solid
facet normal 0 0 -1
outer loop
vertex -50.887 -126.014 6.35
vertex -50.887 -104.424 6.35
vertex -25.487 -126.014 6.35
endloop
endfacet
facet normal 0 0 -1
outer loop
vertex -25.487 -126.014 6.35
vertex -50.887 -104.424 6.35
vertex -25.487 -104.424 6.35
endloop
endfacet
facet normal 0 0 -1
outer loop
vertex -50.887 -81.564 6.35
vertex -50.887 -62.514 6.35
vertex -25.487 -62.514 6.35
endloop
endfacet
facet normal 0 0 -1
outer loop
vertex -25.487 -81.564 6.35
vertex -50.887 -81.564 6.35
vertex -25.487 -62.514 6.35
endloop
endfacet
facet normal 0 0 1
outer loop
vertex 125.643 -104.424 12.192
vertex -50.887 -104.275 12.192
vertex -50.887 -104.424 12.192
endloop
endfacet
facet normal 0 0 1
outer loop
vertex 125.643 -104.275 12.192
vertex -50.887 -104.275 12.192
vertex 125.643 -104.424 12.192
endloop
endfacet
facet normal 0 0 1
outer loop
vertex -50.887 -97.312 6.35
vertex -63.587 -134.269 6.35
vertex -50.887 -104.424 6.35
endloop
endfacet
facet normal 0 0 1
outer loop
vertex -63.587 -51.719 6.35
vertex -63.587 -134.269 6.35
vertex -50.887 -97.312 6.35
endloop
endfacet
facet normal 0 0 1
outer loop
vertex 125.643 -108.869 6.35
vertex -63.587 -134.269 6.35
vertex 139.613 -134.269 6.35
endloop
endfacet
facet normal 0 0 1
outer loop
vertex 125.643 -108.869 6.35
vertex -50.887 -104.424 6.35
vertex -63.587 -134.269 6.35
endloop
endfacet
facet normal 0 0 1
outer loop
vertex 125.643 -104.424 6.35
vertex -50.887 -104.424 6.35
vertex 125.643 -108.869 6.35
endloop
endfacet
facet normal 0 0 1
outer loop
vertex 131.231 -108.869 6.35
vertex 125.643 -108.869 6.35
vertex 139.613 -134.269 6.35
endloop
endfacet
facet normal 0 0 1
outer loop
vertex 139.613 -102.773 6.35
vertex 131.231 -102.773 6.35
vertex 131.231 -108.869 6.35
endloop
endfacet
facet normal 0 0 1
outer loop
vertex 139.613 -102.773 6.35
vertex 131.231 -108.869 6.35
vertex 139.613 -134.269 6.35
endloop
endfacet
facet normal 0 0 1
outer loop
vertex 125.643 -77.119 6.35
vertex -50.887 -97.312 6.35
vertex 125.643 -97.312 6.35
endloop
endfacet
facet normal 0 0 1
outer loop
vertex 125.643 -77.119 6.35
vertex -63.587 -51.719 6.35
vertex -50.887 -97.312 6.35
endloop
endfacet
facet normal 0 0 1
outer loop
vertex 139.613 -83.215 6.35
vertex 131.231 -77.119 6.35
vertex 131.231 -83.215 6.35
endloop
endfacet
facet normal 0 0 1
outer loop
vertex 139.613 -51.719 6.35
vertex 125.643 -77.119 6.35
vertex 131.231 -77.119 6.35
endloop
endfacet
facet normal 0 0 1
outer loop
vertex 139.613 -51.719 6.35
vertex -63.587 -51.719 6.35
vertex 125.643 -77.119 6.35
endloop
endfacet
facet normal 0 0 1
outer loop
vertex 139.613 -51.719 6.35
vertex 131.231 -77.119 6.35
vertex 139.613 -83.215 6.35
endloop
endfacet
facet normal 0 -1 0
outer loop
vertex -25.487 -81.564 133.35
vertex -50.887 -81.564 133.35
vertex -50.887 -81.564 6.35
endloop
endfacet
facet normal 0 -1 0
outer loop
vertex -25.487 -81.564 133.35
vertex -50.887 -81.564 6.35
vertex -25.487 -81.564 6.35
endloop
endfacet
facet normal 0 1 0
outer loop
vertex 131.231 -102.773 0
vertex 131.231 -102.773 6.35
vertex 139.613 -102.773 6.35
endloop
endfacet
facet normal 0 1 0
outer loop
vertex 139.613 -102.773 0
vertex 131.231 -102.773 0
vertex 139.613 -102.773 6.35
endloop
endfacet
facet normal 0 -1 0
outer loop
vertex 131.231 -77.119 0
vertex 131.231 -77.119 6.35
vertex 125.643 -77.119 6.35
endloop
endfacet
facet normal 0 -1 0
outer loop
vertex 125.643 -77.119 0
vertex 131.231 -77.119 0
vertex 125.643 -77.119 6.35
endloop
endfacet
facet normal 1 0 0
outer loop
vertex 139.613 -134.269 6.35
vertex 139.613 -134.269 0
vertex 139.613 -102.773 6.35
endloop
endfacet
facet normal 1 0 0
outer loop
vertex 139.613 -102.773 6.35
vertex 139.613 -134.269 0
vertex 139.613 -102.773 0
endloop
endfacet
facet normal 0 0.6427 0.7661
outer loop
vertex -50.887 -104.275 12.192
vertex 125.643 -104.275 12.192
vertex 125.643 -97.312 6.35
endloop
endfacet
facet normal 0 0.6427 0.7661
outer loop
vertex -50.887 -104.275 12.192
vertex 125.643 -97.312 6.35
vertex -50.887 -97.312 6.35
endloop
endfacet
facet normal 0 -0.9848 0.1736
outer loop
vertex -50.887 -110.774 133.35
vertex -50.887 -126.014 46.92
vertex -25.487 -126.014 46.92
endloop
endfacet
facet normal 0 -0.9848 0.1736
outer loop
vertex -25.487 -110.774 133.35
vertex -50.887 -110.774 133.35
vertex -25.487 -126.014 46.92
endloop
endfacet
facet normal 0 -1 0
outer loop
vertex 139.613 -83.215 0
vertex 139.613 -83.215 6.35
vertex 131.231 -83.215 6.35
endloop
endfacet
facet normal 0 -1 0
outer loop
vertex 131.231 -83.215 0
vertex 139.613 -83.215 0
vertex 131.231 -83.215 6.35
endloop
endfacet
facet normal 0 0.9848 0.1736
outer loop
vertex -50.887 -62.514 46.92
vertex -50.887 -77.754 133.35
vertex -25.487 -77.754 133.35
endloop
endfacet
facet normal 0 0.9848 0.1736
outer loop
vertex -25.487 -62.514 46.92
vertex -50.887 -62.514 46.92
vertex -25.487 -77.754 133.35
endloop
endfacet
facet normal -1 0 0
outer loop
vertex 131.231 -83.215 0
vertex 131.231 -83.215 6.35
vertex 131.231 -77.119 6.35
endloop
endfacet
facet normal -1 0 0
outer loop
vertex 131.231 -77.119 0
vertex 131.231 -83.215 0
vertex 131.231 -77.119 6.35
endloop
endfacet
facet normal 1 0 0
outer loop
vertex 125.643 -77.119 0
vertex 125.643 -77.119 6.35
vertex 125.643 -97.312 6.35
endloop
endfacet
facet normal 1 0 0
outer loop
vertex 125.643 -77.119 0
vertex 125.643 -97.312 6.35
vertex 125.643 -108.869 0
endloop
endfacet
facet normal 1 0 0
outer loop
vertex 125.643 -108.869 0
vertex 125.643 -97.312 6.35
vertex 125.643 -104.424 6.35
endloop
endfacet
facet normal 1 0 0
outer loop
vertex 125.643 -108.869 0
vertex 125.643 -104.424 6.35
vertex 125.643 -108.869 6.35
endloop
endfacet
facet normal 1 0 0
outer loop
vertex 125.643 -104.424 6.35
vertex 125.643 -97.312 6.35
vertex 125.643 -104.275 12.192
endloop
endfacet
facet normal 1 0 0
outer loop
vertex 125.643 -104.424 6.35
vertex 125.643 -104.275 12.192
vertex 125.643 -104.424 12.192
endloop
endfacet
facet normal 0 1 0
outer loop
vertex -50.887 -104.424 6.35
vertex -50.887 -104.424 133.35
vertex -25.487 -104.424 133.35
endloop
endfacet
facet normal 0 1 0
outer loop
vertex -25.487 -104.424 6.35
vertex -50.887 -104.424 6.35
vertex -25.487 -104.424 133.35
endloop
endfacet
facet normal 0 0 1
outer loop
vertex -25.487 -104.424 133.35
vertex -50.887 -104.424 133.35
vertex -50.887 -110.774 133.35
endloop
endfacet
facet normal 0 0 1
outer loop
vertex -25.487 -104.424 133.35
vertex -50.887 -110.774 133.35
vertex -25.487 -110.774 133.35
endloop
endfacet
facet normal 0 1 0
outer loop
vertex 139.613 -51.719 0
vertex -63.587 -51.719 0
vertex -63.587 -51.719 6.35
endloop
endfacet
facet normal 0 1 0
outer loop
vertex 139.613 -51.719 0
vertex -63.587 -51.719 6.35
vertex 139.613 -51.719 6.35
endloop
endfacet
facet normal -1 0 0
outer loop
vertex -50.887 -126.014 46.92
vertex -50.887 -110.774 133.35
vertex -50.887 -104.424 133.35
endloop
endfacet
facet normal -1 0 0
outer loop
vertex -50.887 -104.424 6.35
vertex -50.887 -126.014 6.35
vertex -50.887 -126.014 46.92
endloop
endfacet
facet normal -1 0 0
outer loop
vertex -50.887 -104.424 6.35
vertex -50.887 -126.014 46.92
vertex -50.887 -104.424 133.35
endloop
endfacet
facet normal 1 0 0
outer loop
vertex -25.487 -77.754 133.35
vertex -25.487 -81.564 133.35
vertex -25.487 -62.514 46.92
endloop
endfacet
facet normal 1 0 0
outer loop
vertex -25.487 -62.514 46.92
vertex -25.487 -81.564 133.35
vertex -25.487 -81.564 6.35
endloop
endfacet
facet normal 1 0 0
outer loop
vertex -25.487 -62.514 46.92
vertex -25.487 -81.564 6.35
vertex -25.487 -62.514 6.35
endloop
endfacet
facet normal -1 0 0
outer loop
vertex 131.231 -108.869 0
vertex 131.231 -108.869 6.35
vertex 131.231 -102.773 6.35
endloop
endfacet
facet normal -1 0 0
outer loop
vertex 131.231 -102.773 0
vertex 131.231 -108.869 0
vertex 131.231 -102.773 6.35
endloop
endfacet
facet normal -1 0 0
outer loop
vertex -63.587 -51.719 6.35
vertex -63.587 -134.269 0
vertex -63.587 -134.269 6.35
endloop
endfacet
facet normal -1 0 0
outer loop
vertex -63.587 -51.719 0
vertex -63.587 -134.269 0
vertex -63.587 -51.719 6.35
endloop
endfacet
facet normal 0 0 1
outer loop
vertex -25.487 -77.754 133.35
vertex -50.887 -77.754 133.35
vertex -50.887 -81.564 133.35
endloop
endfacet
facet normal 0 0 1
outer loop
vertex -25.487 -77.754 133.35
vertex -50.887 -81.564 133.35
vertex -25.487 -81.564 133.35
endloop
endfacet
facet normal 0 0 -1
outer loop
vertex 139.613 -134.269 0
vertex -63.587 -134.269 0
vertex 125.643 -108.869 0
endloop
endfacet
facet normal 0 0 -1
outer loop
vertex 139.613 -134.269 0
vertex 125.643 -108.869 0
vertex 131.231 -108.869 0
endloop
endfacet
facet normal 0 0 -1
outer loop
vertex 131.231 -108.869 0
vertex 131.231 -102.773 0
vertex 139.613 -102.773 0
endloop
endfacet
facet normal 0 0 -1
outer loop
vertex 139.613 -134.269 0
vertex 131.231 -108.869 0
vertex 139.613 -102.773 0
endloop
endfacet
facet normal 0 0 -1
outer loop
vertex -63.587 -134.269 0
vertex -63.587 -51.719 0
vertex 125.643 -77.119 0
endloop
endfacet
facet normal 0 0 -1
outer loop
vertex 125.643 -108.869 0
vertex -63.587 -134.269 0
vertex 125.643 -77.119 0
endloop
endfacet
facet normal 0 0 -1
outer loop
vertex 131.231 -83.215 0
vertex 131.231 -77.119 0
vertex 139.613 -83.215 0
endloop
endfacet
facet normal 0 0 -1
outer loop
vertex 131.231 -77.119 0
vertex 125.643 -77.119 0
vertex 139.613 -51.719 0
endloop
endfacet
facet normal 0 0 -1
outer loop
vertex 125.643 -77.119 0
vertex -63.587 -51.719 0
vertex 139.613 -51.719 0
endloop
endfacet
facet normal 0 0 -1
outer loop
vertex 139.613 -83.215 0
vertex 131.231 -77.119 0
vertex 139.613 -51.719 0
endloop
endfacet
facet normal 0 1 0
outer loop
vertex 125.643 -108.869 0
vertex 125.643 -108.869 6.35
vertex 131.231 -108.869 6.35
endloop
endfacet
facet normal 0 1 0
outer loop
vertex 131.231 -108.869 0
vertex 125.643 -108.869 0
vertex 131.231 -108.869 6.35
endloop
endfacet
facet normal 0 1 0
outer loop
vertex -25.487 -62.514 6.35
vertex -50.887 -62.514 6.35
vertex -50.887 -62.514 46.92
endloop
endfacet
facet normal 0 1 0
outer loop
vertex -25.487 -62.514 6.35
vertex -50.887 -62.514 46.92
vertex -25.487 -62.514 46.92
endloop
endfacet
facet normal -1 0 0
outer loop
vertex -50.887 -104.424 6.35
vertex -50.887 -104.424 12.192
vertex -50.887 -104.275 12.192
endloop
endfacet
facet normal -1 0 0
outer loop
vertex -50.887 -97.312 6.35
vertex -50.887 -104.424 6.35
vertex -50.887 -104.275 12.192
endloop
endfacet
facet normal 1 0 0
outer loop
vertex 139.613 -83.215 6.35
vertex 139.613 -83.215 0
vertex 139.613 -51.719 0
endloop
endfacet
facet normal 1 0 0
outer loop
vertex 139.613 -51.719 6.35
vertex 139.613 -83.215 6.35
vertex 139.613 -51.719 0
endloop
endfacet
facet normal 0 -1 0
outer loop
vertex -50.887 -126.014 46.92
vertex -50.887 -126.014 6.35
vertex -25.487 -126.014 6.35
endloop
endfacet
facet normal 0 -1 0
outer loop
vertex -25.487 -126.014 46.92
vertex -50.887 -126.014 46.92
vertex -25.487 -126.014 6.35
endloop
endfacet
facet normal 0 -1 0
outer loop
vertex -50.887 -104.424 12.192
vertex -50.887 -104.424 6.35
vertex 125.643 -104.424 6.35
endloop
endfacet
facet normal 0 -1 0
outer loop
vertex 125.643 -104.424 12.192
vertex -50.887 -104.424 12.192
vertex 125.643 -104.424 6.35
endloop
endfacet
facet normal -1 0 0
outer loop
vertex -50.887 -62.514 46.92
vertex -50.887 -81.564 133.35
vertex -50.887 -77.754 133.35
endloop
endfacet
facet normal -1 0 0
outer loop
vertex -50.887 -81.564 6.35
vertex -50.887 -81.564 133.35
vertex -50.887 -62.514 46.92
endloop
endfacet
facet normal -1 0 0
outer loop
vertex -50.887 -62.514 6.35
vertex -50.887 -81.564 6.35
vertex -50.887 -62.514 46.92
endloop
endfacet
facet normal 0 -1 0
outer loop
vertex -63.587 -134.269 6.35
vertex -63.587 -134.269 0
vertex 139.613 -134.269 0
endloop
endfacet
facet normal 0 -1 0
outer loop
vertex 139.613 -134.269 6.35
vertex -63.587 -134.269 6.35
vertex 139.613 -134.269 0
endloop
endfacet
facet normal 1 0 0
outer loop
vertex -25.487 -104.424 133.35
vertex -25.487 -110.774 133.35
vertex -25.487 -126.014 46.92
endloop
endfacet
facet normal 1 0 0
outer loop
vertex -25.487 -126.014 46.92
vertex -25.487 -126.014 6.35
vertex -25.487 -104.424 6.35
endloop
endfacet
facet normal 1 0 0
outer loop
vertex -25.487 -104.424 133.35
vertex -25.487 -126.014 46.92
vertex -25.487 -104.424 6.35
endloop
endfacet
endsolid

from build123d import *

# Parameters (mm, degrees)
F0_W     = 203.2
F0_H     = 82.55
F1_DEPTH = 6.35
F3_DEPTH = 25.4
F4_W     = 25.4
F4_H     = 21.59
F5_DEPTH = 127
F4_H_2   = 19.05
F6_SIZE2 = 15.24
F6_SIZE  = 86.430334931
F7_SIZE2 = 15.24
F7_SIZE  = 86.430334931
F4_W_2   = 151.13
F4_H_3   = 7.112
F8_DEPTH = 5.842
F9_SIZE2 = 6.962214
F9_SIZE  = 5.84199


# Not quite as in the source:
# - a fillet or chamfer is up to 0.001 mm smaller than in the source, because OpenCascade refuses the exact size
# - a feature names something its author has since deleted; it is built from what else it names


with BuildPart() as f1:
    # F0 (on Top) → F1 (new body)
    with BuildSketch(Plane.XY):
        with Locations((38.0131614566, -92.994289273)):
            Rectangle(F0_W, F0_H)
    extrude(amount=F1_DEPTH)

    # F2 (on face) → F3 (cut)
    with BuildSketch(Plane.XY.offset(6.35)):
        Polygon((131.2311614566, -83.215289273), (131.2311614566, -77.119289273), (125.6431614566, -77.119289273), (125.6431614566, -108.869289273), (131.2311614566, -108.869289273), (131.2311614566, -102.773289273), (139.6131614566, -102.773289273), (139.6131614566, -83.215289273), align=None)
    extrude(amount=-F3_DEPTH, mode=Mode.SUBTRACT)

    # F4 (on face) → F8 (join)
    with BuildSketch(Plane.XY.offset(6.35)):
        with Locations((50.0781614566, -100.868289273)):
            Rectangle(F4_W_2, F4_H_3)
        with Locations((-38.1868385434, -100.868289273)):
            Rectangle(F4_W, F4_H_3)
    extrude(amount=F8_DEPTH)

    # F9 (size 5.842 and 6.9622244879 in the source; OpenCascade refuses exactly that, so slightly less here)
    f9_edges = [f1.edges().sort_by_distance(p)[0] for p in [
        (37.378161, -97.312289, 12.192),
    ]]
    f9_side = f1.faces().sort_by_distance((37.378161, -97.312289, 9.271))[0]
    chamfer(f9_edges, length=F9_SIZE, length2=F9_SIZE2, reference=f9_side)


with BuildPart() as f5:
    # F4 (on face) → F5 (new body)
    with BuildSketch(Plane.XY.offset(6.35)):
        with Locations((-38.1868385434, -115.219289273)):
            Rectangle(F4_W, F4_H)
    extrude(amount=F5_DEPTH)

    # F6
    f6_edges = [f5.edges().sort_by_distance(p)[0] for p in [
        (-38.186839, -126.014289, 133.35),
    ]]
    f6_side = f5.faces().sort_by_distance((-38.186839, -126.014289, 69.85))[0]
    chamfer(f6_edges, length=F6_SIZE, length2=F6_SIZE2, reference=f6_side)


with BuildPart() as f5b:
    # F4 (on face) → F5, piece 2 (new body)
    with BuildSketch(Plane.XY.offset(6.35)):
        with Locations((-38.1868385434, -72.039289273)):
            Rectangle(F4_W, F4_H_2)
    extrude(amount=F5_DEPTH)

    # F7
    f7_edges = [f5b.edges().sort_by_distance(p)[0] for p in [
        (-38.186839, -62.514289, 133.35),
    ]]
    f7_side = f5b.faces().sort_by_distance((-38.186839, -62.514289, 69.85))[0]
    chamfer(f7_edges, length=F7_SIZE, length2=F7_SIZE2, reference=f7_side)


solid = Compound([f1.part, f5.part, f5b.part])
